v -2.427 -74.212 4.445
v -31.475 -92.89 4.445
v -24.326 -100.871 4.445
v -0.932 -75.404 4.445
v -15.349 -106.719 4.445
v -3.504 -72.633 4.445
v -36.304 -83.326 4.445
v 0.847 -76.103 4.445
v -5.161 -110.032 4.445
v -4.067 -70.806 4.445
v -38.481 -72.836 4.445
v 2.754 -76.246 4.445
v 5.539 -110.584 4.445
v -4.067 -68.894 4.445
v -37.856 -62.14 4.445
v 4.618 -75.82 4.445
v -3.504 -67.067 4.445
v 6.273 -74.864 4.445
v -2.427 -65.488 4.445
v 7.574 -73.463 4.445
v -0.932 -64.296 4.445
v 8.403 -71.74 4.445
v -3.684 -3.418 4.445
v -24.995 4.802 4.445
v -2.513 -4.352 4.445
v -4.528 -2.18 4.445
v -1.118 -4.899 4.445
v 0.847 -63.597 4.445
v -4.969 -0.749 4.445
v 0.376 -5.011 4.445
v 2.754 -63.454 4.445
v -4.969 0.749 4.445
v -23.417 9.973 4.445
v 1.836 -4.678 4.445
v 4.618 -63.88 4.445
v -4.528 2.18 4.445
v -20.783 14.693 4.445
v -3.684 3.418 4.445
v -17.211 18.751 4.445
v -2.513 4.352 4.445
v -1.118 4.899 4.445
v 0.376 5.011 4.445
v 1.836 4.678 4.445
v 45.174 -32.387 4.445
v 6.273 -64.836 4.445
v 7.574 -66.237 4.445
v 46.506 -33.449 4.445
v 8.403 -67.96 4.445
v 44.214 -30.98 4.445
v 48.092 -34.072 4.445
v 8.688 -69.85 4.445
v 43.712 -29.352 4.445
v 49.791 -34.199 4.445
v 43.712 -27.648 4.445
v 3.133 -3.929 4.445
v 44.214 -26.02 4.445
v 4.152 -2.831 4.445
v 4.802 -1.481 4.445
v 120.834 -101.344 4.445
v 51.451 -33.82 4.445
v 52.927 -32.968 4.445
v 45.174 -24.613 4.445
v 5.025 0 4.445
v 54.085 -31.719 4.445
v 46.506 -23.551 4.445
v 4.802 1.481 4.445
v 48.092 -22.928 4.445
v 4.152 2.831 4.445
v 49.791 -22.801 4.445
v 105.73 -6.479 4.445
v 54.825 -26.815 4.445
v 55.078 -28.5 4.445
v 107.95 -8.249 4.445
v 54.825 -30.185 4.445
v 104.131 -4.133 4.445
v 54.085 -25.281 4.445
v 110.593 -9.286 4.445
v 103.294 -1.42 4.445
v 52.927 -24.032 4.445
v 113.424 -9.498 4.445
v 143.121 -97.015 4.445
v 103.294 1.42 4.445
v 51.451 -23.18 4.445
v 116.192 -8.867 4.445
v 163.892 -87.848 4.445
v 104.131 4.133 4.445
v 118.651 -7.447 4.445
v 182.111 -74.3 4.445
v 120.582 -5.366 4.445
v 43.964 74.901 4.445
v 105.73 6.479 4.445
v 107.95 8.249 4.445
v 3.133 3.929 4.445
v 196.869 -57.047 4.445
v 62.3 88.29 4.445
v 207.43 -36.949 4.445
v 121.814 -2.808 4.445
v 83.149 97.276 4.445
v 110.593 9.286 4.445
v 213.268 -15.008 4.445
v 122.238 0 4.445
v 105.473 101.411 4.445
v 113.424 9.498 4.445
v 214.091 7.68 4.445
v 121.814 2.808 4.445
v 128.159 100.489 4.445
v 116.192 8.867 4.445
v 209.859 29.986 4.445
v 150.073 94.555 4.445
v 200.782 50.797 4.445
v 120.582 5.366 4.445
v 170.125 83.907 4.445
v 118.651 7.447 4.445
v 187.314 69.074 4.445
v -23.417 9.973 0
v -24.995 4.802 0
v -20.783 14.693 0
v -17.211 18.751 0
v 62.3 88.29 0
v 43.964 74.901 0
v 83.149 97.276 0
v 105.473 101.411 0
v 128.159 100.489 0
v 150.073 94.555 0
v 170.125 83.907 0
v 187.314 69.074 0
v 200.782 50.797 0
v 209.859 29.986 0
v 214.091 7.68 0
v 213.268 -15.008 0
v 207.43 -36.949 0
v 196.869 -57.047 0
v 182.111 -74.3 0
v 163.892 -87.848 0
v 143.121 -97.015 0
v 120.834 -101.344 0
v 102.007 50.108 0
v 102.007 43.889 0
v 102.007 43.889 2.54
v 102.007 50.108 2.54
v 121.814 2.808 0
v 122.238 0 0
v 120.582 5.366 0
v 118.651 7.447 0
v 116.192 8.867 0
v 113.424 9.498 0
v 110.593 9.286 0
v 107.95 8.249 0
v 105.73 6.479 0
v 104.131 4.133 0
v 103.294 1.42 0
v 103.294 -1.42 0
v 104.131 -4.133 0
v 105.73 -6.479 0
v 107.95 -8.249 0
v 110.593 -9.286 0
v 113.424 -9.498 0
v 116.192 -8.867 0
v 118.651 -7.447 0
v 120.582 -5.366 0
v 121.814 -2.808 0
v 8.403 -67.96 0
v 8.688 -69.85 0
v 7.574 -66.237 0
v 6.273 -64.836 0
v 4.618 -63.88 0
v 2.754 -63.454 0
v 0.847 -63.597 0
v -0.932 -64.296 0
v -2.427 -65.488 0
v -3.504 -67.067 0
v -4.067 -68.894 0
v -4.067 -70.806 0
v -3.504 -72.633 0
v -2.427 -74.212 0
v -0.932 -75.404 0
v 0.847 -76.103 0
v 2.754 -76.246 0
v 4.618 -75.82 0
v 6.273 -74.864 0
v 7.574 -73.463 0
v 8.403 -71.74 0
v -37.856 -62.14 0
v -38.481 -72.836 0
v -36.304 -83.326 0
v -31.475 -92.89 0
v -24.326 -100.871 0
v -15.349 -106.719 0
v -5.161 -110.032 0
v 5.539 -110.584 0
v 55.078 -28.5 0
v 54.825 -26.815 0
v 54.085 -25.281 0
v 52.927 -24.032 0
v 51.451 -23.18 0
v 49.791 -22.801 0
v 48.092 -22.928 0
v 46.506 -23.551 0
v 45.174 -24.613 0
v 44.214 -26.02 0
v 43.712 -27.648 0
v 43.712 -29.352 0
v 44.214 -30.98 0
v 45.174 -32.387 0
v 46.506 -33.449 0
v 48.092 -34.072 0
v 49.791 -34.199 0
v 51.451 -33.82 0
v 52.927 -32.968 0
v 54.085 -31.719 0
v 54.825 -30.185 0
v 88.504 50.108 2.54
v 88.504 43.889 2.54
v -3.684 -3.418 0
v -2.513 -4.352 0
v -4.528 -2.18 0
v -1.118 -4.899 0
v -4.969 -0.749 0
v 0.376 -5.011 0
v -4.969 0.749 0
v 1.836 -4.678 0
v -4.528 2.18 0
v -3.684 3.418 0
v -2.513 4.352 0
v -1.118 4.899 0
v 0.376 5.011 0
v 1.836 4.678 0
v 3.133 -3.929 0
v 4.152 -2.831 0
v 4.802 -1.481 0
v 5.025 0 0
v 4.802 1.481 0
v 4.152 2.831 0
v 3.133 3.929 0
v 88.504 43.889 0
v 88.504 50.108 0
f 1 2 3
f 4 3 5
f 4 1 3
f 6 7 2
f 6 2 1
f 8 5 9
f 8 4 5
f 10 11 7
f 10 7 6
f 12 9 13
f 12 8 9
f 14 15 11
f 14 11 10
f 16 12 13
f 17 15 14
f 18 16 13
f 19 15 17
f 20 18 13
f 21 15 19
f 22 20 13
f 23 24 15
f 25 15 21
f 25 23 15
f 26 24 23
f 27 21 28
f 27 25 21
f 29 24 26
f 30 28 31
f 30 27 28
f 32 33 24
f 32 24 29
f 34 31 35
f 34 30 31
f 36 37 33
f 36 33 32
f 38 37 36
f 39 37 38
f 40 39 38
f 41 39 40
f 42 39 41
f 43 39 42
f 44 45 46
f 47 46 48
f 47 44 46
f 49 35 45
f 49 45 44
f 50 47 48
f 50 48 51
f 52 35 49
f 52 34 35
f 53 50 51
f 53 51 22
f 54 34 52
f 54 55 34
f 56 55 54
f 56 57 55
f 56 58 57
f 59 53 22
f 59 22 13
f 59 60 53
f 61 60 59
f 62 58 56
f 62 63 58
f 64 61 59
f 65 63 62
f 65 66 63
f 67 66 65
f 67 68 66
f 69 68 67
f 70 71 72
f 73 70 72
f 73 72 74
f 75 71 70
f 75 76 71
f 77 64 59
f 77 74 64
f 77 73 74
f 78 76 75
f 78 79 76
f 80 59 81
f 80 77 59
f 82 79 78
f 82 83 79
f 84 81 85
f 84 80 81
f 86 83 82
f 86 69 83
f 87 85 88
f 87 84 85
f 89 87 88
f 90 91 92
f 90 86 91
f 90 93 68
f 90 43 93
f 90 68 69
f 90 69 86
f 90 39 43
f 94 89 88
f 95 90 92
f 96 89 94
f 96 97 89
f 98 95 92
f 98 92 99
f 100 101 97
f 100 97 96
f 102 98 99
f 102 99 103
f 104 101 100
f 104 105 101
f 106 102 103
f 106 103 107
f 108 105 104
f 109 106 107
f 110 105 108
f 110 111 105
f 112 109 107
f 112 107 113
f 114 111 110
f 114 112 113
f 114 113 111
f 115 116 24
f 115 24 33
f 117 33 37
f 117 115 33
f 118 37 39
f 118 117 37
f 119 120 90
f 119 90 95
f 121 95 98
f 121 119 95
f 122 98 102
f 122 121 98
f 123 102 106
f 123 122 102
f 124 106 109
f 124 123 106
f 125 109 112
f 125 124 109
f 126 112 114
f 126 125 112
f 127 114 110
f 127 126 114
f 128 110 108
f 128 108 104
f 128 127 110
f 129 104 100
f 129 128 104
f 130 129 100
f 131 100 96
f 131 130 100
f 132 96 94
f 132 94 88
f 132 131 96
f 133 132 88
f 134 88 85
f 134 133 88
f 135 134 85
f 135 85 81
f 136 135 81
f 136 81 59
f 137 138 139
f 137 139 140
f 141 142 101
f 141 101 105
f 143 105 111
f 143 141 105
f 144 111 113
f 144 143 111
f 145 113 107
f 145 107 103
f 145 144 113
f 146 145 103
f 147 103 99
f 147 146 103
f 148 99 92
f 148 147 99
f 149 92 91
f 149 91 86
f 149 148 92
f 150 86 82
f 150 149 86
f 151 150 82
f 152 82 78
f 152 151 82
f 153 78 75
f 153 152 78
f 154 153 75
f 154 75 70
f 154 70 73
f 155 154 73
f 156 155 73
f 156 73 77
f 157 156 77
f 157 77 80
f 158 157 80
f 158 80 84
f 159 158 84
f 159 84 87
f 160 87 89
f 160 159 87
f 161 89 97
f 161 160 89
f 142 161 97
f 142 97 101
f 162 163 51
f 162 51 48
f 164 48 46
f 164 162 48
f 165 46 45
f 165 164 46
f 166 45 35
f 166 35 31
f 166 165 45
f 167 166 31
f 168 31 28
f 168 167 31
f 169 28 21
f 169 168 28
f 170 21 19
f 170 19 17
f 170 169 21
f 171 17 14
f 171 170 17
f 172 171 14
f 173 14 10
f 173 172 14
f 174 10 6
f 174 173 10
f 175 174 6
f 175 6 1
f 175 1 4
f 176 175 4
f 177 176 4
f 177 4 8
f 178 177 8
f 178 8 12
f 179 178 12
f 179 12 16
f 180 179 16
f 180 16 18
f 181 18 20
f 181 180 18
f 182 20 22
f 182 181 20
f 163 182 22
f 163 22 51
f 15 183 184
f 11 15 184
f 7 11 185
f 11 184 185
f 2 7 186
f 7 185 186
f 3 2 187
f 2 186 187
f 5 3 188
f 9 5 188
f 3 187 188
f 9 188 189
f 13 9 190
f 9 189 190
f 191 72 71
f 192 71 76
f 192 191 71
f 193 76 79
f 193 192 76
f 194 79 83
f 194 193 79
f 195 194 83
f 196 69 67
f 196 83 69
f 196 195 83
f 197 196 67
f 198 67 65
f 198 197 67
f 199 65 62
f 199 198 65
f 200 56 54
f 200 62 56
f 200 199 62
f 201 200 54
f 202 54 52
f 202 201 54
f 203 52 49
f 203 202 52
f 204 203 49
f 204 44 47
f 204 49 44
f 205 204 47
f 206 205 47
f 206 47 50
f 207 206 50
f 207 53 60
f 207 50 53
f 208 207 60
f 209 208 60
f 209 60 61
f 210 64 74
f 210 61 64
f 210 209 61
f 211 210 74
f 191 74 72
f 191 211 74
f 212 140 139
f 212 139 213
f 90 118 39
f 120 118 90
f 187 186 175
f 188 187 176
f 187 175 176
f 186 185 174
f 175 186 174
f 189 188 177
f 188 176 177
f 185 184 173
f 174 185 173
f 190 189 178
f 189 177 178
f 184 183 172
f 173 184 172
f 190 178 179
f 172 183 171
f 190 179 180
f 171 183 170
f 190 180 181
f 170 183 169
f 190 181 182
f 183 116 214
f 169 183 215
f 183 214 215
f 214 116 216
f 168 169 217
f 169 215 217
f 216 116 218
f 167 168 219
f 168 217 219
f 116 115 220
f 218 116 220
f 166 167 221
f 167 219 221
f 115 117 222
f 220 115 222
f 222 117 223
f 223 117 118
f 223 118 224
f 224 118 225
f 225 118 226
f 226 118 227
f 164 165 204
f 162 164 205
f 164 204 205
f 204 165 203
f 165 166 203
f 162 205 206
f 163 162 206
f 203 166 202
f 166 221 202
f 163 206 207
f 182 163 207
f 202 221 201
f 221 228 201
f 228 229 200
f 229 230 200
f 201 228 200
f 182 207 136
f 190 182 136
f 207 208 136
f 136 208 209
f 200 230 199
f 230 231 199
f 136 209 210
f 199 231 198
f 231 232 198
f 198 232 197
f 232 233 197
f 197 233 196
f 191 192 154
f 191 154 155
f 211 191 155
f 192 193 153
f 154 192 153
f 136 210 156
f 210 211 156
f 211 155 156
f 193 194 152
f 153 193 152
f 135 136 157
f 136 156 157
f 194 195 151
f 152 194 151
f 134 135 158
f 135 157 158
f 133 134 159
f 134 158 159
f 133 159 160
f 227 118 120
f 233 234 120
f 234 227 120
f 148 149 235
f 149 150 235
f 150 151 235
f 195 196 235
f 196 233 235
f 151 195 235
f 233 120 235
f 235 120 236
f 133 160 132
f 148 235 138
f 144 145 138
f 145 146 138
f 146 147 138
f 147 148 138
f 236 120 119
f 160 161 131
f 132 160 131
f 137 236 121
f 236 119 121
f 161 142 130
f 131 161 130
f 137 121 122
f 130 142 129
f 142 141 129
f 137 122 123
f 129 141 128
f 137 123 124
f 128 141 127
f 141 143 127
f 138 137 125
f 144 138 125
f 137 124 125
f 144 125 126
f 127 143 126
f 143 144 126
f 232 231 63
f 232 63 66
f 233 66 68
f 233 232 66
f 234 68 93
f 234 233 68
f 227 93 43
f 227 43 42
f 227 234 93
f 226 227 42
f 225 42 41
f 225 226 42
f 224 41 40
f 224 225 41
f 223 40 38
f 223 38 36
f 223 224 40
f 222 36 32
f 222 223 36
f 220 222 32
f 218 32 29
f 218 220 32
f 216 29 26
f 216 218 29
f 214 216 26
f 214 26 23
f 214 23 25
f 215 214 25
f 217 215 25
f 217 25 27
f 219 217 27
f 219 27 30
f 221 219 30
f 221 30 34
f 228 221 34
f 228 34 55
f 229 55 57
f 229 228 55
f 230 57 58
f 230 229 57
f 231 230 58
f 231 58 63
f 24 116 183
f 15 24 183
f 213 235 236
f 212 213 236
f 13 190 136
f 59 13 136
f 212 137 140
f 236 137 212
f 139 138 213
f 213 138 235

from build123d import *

# Parameters (mm, degrees)
SKETCH1_R           = 5.0254
SKETCH1_R_2         = 9.525
BOSS_EXTRUDE1_DEPTH = 4.445
SKETCH3_R           = 5.715
CUT_EXTRUDE4_DEPTH  = 238.309326519
SKETCH2_R           = 6.4135
BOSS_EXTRUDE2_DEPTH = 4.445
SKETCH6_W           = 13.50293176
SKETCH6_H           = 6.21934711
CUT_EXTRUDE6_DEPTH  = 2.54


with BuildPart() as part:
    # Sketch1 → Boss-Extrude1 (new body)
    with BuildSketch(Plane.XY):
        with BuildLine():
            Line((-17.211015945, 18.751241343), (43.963752379, 74.901119305))
            ThreePointArc((43.963752379, 74.901119305), (214.381413502, 0), (43.963752379, -74.901119305))
            Line((43.963752379, -74.901119305), (-17.211015945, -18.751241343))
            ThreePointArc((-17.211015945, -18.751241343), (-25.452467891, 0), (-17.211015945, 18.751241343))
        make_face()
        Circle(SKETCH1_R, mode=Mode.SUBTRACT)
        with Locations((112.7125, 0)):
            Circle(SKETCH1_R_2, mode=Mode.SUBTRACT)
    extrude(amount=BOSS_EXTRUDE1_DEPTH)

    # Sketch3 → Cut-Extrude4 (cut, through all)
    with BuildSketch(Plane.XY):
        with Locations((49.363448016, -28.5)):
            Circle(SKETCH3_R)
    extrude(amount=CUT_EXTRUDE4_DEPTH, mode=Mode.SUBTRACT)

    # Sketch2 → Boss-Extrude2 (add)
    with BuildSketch(Plane.XY):
        with BuildLine():
            Line((-24.995388267, 4.801946178), (-37.855905828, -62.140417979))
            ThreePointArc((-37.855905828, -62.140417979), (-28.163364792, -97.115789925), (5.538841954, -110.583650001))
            Line((5.538841954, -110.583650001), (120.834104773, -101.344005785))
            ThreePointArc((120.834104773, -101.344005785), (79.641074663, -96.139735796), (43.963752379, -74.901119305))
            Line((43.963752379, -74.901119305), (-17.211015945, -18.751241343))
            ThreePointArc((-17.211015945, -18.751241343), (-24.166780914, -7.987166081), (-24.995388267, 4.801946178))
        make_face()
        with Locations((2.274488984, -69.85)):
            Circle(SKETCH2_R, mode=Mode.SUBTRACT)
    extrude(amount=BOSS_EXTRUDE2_DEPTH)

    # Sketch6 → Cut-Extrude6 (cut)
    with BuildSketch(Plane(origin=(0, 0, 0), x_dir=(-1, 0, 0), z_dir=(0, 0, -1))):
        with Locations((-95.255563191, 46.998761557)):
            Rectangle(SKETCH6_W, SKETCH6_H)
    extrude(amount=-CUT_EXTRUDE6_DEPTH, mode=Mode.SUBTRACT)


solid = part.part
